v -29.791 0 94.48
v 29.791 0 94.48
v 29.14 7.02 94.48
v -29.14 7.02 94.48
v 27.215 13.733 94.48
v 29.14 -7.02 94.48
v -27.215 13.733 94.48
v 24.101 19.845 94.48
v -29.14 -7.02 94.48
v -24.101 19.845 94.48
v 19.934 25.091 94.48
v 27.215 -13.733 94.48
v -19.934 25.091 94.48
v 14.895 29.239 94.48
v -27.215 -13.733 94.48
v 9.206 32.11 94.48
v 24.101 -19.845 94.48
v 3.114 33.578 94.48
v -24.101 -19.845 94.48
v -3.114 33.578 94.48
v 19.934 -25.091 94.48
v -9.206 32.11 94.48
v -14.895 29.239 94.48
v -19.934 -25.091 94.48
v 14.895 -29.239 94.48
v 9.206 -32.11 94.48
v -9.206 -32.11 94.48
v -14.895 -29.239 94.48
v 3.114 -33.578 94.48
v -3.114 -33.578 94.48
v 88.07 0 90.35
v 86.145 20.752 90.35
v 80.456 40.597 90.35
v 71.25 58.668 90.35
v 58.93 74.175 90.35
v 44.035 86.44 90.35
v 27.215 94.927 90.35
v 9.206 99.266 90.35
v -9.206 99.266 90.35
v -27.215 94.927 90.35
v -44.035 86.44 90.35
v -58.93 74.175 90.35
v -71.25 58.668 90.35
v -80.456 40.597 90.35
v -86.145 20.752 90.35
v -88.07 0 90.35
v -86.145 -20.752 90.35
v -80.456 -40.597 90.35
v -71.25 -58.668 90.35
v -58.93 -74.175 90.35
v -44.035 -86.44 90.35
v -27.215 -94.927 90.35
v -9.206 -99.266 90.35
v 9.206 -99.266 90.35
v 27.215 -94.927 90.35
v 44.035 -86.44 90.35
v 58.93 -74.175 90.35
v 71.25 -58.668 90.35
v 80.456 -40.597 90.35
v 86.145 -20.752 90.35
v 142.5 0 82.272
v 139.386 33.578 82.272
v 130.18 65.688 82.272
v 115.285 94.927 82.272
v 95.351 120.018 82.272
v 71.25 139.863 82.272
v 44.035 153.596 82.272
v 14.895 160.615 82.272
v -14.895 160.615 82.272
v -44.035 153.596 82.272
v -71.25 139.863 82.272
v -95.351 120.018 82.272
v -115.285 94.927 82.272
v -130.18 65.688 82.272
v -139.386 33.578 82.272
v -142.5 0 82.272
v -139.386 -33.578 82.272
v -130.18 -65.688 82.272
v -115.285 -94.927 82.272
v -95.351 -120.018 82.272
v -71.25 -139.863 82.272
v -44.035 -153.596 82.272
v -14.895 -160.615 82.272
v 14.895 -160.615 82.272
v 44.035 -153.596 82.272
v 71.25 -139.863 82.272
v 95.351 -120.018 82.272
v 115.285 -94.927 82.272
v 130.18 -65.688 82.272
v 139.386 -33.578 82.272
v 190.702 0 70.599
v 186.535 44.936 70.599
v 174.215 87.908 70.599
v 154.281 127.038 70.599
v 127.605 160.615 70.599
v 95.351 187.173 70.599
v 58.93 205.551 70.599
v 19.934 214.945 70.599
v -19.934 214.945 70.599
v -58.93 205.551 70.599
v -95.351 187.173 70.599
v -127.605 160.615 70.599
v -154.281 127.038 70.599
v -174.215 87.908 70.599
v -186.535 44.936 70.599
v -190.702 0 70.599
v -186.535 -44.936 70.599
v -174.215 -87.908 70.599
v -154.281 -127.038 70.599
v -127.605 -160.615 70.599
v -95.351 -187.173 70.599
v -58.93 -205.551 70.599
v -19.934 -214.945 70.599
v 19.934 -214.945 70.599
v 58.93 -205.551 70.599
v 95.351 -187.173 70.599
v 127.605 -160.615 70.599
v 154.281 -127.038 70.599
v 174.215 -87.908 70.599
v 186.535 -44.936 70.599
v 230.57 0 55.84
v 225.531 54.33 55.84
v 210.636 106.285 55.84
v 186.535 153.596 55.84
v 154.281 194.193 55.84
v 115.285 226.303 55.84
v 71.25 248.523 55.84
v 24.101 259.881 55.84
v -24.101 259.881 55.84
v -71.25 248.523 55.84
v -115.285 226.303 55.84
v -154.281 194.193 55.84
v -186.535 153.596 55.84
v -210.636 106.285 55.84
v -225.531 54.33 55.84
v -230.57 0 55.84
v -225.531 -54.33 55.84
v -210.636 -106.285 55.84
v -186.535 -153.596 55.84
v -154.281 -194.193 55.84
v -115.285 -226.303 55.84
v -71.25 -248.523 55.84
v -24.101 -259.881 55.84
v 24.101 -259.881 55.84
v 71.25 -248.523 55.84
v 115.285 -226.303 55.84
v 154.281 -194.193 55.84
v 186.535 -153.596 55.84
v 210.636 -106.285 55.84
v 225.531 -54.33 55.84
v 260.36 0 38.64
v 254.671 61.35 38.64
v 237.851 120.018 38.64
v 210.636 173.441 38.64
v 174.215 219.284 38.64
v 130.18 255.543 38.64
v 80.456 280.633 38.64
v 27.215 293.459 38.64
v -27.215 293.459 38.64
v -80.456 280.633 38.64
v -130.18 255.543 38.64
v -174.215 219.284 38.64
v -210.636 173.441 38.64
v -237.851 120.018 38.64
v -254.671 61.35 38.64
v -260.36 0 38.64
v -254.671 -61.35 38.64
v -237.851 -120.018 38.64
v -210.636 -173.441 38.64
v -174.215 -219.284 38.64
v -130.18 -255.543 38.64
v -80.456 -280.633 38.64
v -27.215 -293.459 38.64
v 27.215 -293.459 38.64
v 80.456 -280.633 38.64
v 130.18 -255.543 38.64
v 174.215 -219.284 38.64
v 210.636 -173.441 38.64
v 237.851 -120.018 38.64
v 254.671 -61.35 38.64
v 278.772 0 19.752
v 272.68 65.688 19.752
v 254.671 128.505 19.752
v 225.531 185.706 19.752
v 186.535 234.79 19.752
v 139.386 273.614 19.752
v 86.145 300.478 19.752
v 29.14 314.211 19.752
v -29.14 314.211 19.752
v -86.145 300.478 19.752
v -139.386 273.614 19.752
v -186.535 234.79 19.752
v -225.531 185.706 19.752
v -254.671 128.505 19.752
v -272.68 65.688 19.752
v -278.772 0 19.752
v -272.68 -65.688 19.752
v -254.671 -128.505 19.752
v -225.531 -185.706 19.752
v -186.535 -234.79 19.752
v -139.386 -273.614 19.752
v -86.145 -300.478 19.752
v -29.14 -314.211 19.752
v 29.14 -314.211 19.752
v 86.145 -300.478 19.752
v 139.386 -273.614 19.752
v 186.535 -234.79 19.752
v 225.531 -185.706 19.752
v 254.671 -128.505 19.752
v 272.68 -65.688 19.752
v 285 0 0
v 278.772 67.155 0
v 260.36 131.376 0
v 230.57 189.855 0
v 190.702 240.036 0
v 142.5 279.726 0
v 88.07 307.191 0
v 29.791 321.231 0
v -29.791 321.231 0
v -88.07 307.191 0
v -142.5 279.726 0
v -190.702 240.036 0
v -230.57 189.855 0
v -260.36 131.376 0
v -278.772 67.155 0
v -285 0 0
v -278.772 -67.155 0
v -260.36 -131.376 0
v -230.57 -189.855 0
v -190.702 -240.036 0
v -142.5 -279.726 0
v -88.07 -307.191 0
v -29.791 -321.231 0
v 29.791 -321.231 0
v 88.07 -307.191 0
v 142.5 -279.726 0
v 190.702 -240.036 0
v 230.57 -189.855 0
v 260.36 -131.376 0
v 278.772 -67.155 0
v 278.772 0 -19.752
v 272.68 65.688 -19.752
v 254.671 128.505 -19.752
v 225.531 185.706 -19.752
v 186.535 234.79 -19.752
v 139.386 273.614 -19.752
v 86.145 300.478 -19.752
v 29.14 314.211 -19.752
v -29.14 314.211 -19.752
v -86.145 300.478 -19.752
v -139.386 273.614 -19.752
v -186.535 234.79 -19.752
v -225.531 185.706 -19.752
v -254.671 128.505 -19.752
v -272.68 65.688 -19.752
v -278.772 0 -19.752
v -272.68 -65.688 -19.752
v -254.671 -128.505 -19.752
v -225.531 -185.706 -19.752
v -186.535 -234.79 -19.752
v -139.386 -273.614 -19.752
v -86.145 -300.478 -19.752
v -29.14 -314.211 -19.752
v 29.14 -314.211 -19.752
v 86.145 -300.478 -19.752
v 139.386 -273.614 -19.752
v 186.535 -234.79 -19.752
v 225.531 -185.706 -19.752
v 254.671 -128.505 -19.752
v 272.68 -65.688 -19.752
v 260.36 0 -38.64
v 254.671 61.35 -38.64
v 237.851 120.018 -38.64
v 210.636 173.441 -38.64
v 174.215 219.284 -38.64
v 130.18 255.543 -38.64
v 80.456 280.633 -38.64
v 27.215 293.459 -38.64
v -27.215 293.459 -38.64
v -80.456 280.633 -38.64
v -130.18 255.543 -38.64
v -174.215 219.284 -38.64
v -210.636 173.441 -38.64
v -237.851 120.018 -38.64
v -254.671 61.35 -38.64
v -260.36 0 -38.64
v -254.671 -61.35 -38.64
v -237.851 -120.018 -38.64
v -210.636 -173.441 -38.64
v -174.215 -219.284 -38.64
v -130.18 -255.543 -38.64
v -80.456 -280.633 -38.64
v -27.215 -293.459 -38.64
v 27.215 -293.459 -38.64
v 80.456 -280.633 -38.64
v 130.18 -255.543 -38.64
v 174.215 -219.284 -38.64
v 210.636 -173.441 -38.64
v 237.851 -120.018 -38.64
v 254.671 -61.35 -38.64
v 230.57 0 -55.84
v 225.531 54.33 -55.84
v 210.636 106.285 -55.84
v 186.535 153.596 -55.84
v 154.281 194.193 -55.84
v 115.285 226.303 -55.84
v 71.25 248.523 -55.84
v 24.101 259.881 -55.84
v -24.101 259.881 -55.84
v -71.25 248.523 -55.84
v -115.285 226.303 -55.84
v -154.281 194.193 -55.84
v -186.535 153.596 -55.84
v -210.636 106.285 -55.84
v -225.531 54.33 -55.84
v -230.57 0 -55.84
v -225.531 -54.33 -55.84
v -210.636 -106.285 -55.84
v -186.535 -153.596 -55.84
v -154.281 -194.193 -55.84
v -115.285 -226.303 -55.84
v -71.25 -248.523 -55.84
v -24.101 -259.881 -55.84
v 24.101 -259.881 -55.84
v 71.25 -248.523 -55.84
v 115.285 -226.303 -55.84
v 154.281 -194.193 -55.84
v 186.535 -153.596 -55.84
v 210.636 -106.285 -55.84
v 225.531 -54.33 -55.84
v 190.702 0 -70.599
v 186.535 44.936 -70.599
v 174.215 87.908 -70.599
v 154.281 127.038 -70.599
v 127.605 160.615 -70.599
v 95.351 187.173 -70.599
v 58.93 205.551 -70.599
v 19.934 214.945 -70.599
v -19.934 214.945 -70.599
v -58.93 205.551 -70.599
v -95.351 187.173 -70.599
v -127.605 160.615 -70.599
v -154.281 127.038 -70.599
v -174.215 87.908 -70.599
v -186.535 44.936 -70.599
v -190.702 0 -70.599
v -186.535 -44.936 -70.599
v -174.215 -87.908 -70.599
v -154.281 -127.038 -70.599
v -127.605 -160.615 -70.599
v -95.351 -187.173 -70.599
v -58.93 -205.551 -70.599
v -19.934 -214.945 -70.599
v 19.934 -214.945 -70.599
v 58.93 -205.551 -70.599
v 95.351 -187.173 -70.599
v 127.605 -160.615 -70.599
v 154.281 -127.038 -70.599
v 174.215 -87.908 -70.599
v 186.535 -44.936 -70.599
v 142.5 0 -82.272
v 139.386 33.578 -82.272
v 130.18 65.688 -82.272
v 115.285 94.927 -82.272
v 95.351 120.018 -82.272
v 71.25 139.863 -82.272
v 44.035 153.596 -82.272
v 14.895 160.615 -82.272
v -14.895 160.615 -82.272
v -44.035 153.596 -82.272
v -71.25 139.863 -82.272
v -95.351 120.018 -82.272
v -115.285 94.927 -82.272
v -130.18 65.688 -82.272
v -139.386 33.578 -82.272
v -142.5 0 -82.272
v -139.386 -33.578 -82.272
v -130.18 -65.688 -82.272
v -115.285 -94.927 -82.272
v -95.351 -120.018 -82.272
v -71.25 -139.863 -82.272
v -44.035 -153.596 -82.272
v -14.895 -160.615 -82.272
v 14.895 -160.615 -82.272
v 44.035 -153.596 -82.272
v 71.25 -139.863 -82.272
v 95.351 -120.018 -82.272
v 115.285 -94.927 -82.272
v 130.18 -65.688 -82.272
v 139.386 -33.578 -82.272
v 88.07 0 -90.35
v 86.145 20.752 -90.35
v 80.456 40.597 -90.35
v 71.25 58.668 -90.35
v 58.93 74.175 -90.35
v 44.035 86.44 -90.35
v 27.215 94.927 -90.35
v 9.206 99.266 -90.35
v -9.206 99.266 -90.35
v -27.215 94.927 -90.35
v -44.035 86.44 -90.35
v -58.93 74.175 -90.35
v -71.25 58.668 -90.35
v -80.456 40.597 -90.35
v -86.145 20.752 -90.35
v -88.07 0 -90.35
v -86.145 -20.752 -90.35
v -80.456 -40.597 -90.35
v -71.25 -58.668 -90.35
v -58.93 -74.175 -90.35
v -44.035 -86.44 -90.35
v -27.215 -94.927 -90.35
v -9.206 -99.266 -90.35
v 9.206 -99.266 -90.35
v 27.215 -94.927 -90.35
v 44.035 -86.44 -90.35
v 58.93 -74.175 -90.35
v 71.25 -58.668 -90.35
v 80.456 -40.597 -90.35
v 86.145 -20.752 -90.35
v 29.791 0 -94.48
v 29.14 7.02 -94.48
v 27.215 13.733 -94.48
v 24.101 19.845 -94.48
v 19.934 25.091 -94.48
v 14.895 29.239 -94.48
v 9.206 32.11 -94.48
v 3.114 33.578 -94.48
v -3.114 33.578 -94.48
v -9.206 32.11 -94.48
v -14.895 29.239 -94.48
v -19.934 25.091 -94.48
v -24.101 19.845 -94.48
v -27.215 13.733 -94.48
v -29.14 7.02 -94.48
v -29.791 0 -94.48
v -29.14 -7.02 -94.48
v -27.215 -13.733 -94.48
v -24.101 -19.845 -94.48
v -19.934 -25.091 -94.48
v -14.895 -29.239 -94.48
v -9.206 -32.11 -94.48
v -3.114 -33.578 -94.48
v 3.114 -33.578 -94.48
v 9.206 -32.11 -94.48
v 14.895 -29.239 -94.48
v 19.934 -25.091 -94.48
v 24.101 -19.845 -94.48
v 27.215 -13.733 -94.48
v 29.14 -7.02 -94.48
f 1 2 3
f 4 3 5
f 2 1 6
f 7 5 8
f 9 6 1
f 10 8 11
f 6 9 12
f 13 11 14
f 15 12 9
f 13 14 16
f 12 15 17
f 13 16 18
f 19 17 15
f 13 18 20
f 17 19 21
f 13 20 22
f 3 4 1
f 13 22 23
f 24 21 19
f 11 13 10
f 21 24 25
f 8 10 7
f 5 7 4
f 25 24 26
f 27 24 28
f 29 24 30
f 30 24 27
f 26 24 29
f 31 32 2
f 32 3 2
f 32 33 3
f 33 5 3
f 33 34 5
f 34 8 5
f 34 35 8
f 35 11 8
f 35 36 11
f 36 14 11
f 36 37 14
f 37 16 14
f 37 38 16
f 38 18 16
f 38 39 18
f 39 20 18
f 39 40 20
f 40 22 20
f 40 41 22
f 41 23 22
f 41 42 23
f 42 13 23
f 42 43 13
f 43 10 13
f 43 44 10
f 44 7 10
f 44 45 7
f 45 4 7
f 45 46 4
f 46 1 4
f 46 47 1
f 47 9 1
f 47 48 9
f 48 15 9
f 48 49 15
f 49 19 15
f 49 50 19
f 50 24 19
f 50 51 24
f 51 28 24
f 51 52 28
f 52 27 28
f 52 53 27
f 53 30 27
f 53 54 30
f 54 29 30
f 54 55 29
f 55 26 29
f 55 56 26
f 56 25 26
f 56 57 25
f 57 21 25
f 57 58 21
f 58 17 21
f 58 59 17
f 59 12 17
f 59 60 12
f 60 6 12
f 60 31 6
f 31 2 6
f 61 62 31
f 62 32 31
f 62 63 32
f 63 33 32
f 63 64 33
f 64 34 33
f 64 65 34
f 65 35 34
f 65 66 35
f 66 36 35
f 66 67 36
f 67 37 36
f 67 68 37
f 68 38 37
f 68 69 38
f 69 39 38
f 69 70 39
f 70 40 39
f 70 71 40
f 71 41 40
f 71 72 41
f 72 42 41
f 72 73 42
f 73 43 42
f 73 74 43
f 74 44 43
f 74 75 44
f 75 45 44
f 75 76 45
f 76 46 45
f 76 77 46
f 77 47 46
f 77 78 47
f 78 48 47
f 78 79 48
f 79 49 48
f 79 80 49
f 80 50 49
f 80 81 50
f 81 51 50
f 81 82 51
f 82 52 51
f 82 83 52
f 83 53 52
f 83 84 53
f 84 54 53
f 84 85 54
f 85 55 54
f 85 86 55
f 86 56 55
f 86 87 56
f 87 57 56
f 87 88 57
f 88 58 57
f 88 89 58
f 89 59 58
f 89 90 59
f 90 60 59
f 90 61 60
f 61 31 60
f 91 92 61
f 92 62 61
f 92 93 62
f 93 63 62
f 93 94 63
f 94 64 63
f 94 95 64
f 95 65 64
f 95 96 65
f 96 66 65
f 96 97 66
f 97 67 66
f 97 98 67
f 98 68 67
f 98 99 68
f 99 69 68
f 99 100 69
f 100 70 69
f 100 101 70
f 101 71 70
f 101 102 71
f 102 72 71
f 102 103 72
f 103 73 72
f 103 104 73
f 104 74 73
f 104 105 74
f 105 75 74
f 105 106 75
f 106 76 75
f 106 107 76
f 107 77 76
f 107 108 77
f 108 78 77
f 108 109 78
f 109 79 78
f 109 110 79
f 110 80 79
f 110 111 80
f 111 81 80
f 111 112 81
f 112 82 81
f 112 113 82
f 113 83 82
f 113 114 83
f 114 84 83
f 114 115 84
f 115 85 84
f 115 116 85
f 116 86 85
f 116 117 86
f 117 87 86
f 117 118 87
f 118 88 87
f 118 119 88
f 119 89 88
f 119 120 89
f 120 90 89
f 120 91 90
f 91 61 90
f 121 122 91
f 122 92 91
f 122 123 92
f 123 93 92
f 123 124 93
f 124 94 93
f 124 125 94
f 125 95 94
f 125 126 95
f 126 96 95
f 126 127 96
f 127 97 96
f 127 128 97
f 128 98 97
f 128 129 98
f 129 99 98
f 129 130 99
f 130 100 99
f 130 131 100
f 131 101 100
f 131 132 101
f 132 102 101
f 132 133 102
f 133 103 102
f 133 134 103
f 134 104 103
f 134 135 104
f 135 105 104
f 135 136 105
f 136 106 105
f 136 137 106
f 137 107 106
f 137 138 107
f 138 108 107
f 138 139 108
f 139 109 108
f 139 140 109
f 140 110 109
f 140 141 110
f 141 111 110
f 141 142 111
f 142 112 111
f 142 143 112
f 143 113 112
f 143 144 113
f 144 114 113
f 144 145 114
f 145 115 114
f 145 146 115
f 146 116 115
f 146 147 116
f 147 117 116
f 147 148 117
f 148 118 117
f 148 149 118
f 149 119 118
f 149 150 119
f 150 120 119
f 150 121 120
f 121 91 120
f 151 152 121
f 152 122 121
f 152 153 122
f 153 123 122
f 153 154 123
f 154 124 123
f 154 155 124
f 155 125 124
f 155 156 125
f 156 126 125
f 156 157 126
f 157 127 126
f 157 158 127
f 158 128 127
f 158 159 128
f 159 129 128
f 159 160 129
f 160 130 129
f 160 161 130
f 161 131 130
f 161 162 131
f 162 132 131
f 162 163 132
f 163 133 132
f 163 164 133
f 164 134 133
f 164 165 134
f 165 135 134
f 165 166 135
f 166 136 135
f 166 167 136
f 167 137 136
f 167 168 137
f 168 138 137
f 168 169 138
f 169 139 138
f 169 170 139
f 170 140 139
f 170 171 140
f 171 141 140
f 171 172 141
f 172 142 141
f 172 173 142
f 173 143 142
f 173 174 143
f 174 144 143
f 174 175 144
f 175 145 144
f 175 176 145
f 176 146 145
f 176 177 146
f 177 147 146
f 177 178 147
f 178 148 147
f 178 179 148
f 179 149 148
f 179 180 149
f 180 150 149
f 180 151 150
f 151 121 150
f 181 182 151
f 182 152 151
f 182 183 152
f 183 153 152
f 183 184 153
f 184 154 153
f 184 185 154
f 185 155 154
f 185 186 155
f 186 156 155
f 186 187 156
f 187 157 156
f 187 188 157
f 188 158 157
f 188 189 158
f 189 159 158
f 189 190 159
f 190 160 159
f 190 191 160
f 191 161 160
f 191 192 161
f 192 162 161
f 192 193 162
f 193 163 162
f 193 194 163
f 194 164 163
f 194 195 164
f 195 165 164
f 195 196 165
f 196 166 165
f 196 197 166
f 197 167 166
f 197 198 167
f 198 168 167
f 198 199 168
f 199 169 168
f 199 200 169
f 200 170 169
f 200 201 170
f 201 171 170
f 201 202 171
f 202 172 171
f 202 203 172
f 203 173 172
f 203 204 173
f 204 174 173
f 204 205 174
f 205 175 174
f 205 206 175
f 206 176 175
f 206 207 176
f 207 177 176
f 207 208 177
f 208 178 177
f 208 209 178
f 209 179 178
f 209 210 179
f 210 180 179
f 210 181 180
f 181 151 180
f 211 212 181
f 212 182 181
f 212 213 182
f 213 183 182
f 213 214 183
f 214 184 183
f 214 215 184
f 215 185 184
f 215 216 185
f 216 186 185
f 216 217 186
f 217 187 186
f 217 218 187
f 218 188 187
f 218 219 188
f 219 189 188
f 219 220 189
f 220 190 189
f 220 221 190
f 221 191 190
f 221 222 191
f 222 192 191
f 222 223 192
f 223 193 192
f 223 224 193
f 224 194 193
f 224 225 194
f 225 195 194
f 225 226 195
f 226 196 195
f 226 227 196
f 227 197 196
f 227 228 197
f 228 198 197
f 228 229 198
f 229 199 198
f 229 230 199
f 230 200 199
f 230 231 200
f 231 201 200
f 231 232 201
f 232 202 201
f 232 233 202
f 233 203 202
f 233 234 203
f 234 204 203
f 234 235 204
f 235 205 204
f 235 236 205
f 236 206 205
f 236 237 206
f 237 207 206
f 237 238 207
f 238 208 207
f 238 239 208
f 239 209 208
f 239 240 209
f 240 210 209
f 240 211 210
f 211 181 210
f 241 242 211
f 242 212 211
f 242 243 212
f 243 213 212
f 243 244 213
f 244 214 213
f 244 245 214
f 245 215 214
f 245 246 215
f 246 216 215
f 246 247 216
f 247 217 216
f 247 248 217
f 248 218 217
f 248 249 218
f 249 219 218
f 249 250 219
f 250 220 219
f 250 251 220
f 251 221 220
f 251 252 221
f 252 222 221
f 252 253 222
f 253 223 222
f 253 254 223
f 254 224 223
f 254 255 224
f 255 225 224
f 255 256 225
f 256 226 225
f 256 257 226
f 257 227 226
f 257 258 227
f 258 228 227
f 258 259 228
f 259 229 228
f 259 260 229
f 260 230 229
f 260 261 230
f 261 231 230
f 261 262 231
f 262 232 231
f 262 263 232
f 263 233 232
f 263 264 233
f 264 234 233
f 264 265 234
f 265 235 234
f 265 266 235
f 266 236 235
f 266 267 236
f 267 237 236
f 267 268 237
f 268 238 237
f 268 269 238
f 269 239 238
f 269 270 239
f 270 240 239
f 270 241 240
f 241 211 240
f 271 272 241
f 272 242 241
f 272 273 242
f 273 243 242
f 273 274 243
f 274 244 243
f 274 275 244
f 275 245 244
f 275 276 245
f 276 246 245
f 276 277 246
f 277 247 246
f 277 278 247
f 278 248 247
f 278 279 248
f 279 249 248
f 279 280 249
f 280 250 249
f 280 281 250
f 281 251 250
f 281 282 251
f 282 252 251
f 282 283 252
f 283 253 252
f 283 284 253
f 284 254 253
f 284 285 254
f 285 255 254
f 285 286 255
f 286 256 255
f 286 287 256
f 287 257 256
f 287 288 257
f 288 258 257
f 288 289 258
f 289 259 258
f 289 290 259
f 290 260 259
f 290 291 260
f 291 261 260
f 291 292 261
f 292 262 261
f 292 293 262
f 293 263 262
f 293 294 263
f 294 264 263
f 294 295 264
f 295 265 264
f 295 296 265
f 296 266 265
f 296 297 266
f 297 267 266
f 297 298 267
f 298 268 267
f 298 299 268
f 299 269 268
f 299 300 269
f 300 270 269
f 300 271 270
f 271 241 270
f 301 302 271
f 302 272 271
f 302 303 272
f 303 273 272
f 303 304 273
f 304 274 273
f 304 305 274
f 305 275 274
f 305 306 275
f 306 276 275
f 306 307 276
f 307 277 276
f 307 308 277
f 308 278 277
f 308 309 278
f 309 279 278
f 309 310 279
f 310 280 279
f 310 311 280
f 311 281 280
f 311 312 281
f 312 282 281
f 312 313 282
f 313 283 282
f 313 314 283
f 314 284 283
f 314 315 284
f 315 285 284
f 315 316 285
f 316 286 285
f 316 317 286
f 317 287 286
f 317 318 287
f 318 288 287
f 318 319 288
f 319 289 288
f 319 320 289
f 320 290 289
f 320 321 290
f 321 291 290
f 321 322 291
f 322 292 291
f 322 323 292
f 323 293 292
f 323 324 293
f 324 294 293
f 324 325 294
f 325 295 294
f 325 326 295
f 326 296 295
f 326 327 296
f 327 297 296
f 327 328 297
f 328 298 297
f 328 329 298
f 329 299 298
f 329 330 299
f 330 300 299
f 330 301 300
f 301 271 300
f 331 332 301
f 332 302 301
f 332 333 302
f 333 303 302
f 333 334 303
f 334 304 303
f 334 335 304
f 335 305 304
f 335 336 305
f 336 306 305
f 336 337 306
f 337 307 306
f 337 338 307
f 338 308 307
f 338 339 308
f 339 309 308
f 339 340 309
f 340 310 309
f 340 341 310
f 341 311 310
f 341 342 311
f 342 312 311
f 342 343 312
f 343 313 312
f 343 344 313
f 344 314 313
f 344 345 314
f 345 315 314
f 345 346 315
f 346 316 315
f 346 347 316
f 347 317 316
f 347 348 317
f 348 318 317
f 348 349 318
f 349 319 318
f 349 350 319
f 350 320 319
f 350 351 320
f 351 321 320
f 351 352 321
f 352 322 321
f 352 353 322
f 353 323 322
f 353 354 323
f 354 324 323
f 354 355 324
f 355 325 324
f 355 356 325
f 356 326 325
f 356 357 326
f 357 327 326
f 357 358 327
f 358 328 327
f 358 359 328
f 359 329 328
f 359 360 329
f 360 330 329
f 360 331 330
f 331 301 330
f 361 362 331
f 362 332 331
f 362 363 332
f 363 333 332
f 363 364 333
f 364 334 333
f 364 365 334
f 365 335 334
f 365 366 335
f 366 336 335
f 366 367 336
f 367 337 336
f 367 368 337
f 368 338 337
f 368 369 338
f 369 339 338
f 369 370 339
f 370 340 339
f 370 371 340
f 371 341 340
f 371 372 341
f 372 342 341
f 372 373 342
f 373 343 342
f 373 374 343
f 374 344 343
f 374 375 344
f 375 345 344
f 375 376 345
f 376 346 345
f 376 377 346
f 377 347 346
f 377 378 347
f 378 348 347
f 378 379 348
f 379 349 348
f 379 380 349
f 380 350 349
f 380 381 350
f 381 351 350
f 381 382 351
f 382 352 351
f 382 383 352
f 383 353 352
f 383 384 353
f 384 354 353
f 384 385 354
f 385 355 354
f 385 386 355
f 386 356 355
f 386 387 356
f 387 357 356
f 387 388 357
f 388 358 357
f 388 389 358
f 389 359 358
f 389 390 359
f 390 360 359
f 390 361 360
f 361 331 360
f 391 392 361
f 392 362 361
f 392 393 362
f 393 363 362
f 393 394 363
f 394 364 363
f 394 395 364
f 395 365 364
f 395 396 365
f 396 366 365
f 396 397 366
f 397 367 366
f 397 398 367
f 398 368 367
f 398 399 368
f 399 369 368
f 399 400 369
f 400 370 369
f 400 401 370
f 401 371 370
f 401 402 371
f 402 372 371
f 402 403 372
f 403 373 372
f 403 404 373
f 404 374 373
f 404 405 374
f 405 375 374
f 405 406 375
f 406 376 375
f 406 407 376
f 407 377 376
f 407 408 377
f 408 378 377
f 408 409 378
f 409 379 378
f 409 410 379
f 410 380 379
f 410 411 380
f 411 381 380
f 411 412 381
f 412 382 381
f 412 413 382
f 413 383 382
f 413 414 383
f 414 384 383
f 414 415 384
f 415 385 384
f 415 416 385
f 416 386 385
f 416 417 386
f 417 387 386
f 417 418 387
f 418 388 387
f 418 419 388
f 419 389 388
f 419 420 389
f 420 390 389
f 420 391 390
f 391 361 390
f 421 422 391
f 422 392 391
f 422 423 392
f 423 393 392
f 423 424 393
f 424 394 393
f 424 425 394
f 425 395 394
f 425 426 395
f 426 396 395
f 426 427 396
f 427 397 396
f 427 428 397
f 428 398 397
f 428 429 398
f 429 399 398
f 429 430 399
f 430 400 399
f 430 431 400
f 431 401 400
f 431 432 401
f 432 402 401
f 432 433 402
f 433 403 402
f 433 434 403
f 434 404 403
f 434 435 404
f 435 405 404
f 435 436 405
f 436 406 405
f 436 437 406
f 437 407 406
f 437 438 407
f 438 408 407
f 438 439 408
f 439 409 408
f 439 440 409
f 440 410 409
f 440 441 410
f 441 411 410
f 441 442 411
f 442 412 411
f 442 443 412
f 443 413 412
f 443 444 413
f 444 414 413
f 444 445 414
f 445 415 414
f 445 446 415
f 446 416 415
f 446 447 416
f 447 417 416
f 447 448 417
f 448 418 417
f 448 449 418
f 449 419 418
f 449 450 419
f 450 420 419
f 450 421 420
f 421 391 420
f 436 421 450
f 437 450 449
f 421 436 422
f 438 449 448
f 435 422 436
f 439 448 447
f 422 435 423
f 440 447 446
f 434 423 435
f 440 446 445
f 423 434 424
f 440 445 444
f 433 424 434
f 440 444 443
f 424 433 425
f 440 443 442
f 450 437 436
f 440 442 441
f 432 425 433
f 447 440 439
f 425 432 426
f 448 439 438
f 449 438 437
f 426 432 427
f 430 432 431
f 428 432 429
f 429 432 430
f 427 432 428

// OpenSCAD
// Generated by SolidPython 1.0.1 on 2020-07-29 00:46:52


scale(v = [15, 17, 5]) {
	sphere(r = 19);
}
/***********************************************
*********      SolidPython code:      **********
************************************************
 
# import packages: SolidPython
from solid import *
from solid.utils import *
from itertools import chain, combinations, permutations


class Resize:

    def __init__(self, scad_file):
        self.scad_file = scad_file
        #self.scad_file = import_scad(scad_file)
        # cone/cylinder param:
        self.r1 = 0
        self.r2 = 0
        self.h = 0
        # rectangular prism param:
        self.w = 0
        self.l = 0
        # ellipse param:
        self.r = 0

    # import OpenScad code (file name corresponds to shape)


    # classify shape + parameters
    def assign(self, param1, param2, param3):
        if self.scad_file == 'cone.scad':
            self.r1 = param1
            self.r2 = param2
            self.h = param3
        elif self.scad_file == 'cylinder.scad':
            self.r1 = param1
            self.r2 = param2
            self.h = param3
        elif self.scad_file == 'rectangularPrism.scad':
            self.h = param1
            self.l = param2
            self.w = param3
        else:
            self.r = param1
            self.h = param2

    # resize parameters
    def iterate(self):
        x = range(3, 20, 2)
        i = 1
        if self.scad_file == 'cone.scad':
            tempList = list(permutations(x, 2))
            for temp in tempList:
                param1 = temp[0]
                param2 = temp[1]
                filepath = 'produced_scad_files/' + 'cone' + str(param1) + '_' + str(param2) + '_' + '.scad'
                scad_render_to_file(cylinder(h=param1, r1=param2, r2=0), filepath)

        elif self.scad_file == 'cylinder.scad':
            tempList = list(permutations(x, 3))
            for temp in tempList:
                param1 = temp[0]
                param2 = temp[1]
                filepath = 'produced_scad_files/' + 'cylinder' + str(param1) + '_' + str(param2) + '_' + '.scad'
                scad_render_to_file(cylinder(h=param1, r1=param2, r2=param2), filepath)

        elif self.scad_file == 'rectangularPrism.scad':
            tempList = list(permutations(x, 3))
            for temp in tempList:
                param1 = temp[0]
                param2 = temp[1]
                param3 = temp[2]
                filepath = 'produced_scad_files/' + 'rectangularPrism' + str(param1) + '_' + str(param2) + '_' + str(
                    param3) + '.scad'
                scad_render_to_file(cube(size=(param1, param2, param3)), filepath)

        elif self.scad_file == 'ellipse.scad':
            tempList = list(permutations(x, 4))
            for temp in tempList:
                param1 = temp[0]
                param2 = temp[1]
                param3 = temp[2]
                param4 = temp[3]
                filepath = 'produced_scad_files/' + 'ellipse' + str(param1) + '_' + str(param2) + '_' + str(param3) + '_' + str(param4) + '.scad'
                scad_render_to_file(scale([param1, param2, param3])(sphere(r=param4)), filepath)

    def render_to_scadfile(self):
        scad_render_to_file(scad, 'example.scad') 
 
************************************************/
